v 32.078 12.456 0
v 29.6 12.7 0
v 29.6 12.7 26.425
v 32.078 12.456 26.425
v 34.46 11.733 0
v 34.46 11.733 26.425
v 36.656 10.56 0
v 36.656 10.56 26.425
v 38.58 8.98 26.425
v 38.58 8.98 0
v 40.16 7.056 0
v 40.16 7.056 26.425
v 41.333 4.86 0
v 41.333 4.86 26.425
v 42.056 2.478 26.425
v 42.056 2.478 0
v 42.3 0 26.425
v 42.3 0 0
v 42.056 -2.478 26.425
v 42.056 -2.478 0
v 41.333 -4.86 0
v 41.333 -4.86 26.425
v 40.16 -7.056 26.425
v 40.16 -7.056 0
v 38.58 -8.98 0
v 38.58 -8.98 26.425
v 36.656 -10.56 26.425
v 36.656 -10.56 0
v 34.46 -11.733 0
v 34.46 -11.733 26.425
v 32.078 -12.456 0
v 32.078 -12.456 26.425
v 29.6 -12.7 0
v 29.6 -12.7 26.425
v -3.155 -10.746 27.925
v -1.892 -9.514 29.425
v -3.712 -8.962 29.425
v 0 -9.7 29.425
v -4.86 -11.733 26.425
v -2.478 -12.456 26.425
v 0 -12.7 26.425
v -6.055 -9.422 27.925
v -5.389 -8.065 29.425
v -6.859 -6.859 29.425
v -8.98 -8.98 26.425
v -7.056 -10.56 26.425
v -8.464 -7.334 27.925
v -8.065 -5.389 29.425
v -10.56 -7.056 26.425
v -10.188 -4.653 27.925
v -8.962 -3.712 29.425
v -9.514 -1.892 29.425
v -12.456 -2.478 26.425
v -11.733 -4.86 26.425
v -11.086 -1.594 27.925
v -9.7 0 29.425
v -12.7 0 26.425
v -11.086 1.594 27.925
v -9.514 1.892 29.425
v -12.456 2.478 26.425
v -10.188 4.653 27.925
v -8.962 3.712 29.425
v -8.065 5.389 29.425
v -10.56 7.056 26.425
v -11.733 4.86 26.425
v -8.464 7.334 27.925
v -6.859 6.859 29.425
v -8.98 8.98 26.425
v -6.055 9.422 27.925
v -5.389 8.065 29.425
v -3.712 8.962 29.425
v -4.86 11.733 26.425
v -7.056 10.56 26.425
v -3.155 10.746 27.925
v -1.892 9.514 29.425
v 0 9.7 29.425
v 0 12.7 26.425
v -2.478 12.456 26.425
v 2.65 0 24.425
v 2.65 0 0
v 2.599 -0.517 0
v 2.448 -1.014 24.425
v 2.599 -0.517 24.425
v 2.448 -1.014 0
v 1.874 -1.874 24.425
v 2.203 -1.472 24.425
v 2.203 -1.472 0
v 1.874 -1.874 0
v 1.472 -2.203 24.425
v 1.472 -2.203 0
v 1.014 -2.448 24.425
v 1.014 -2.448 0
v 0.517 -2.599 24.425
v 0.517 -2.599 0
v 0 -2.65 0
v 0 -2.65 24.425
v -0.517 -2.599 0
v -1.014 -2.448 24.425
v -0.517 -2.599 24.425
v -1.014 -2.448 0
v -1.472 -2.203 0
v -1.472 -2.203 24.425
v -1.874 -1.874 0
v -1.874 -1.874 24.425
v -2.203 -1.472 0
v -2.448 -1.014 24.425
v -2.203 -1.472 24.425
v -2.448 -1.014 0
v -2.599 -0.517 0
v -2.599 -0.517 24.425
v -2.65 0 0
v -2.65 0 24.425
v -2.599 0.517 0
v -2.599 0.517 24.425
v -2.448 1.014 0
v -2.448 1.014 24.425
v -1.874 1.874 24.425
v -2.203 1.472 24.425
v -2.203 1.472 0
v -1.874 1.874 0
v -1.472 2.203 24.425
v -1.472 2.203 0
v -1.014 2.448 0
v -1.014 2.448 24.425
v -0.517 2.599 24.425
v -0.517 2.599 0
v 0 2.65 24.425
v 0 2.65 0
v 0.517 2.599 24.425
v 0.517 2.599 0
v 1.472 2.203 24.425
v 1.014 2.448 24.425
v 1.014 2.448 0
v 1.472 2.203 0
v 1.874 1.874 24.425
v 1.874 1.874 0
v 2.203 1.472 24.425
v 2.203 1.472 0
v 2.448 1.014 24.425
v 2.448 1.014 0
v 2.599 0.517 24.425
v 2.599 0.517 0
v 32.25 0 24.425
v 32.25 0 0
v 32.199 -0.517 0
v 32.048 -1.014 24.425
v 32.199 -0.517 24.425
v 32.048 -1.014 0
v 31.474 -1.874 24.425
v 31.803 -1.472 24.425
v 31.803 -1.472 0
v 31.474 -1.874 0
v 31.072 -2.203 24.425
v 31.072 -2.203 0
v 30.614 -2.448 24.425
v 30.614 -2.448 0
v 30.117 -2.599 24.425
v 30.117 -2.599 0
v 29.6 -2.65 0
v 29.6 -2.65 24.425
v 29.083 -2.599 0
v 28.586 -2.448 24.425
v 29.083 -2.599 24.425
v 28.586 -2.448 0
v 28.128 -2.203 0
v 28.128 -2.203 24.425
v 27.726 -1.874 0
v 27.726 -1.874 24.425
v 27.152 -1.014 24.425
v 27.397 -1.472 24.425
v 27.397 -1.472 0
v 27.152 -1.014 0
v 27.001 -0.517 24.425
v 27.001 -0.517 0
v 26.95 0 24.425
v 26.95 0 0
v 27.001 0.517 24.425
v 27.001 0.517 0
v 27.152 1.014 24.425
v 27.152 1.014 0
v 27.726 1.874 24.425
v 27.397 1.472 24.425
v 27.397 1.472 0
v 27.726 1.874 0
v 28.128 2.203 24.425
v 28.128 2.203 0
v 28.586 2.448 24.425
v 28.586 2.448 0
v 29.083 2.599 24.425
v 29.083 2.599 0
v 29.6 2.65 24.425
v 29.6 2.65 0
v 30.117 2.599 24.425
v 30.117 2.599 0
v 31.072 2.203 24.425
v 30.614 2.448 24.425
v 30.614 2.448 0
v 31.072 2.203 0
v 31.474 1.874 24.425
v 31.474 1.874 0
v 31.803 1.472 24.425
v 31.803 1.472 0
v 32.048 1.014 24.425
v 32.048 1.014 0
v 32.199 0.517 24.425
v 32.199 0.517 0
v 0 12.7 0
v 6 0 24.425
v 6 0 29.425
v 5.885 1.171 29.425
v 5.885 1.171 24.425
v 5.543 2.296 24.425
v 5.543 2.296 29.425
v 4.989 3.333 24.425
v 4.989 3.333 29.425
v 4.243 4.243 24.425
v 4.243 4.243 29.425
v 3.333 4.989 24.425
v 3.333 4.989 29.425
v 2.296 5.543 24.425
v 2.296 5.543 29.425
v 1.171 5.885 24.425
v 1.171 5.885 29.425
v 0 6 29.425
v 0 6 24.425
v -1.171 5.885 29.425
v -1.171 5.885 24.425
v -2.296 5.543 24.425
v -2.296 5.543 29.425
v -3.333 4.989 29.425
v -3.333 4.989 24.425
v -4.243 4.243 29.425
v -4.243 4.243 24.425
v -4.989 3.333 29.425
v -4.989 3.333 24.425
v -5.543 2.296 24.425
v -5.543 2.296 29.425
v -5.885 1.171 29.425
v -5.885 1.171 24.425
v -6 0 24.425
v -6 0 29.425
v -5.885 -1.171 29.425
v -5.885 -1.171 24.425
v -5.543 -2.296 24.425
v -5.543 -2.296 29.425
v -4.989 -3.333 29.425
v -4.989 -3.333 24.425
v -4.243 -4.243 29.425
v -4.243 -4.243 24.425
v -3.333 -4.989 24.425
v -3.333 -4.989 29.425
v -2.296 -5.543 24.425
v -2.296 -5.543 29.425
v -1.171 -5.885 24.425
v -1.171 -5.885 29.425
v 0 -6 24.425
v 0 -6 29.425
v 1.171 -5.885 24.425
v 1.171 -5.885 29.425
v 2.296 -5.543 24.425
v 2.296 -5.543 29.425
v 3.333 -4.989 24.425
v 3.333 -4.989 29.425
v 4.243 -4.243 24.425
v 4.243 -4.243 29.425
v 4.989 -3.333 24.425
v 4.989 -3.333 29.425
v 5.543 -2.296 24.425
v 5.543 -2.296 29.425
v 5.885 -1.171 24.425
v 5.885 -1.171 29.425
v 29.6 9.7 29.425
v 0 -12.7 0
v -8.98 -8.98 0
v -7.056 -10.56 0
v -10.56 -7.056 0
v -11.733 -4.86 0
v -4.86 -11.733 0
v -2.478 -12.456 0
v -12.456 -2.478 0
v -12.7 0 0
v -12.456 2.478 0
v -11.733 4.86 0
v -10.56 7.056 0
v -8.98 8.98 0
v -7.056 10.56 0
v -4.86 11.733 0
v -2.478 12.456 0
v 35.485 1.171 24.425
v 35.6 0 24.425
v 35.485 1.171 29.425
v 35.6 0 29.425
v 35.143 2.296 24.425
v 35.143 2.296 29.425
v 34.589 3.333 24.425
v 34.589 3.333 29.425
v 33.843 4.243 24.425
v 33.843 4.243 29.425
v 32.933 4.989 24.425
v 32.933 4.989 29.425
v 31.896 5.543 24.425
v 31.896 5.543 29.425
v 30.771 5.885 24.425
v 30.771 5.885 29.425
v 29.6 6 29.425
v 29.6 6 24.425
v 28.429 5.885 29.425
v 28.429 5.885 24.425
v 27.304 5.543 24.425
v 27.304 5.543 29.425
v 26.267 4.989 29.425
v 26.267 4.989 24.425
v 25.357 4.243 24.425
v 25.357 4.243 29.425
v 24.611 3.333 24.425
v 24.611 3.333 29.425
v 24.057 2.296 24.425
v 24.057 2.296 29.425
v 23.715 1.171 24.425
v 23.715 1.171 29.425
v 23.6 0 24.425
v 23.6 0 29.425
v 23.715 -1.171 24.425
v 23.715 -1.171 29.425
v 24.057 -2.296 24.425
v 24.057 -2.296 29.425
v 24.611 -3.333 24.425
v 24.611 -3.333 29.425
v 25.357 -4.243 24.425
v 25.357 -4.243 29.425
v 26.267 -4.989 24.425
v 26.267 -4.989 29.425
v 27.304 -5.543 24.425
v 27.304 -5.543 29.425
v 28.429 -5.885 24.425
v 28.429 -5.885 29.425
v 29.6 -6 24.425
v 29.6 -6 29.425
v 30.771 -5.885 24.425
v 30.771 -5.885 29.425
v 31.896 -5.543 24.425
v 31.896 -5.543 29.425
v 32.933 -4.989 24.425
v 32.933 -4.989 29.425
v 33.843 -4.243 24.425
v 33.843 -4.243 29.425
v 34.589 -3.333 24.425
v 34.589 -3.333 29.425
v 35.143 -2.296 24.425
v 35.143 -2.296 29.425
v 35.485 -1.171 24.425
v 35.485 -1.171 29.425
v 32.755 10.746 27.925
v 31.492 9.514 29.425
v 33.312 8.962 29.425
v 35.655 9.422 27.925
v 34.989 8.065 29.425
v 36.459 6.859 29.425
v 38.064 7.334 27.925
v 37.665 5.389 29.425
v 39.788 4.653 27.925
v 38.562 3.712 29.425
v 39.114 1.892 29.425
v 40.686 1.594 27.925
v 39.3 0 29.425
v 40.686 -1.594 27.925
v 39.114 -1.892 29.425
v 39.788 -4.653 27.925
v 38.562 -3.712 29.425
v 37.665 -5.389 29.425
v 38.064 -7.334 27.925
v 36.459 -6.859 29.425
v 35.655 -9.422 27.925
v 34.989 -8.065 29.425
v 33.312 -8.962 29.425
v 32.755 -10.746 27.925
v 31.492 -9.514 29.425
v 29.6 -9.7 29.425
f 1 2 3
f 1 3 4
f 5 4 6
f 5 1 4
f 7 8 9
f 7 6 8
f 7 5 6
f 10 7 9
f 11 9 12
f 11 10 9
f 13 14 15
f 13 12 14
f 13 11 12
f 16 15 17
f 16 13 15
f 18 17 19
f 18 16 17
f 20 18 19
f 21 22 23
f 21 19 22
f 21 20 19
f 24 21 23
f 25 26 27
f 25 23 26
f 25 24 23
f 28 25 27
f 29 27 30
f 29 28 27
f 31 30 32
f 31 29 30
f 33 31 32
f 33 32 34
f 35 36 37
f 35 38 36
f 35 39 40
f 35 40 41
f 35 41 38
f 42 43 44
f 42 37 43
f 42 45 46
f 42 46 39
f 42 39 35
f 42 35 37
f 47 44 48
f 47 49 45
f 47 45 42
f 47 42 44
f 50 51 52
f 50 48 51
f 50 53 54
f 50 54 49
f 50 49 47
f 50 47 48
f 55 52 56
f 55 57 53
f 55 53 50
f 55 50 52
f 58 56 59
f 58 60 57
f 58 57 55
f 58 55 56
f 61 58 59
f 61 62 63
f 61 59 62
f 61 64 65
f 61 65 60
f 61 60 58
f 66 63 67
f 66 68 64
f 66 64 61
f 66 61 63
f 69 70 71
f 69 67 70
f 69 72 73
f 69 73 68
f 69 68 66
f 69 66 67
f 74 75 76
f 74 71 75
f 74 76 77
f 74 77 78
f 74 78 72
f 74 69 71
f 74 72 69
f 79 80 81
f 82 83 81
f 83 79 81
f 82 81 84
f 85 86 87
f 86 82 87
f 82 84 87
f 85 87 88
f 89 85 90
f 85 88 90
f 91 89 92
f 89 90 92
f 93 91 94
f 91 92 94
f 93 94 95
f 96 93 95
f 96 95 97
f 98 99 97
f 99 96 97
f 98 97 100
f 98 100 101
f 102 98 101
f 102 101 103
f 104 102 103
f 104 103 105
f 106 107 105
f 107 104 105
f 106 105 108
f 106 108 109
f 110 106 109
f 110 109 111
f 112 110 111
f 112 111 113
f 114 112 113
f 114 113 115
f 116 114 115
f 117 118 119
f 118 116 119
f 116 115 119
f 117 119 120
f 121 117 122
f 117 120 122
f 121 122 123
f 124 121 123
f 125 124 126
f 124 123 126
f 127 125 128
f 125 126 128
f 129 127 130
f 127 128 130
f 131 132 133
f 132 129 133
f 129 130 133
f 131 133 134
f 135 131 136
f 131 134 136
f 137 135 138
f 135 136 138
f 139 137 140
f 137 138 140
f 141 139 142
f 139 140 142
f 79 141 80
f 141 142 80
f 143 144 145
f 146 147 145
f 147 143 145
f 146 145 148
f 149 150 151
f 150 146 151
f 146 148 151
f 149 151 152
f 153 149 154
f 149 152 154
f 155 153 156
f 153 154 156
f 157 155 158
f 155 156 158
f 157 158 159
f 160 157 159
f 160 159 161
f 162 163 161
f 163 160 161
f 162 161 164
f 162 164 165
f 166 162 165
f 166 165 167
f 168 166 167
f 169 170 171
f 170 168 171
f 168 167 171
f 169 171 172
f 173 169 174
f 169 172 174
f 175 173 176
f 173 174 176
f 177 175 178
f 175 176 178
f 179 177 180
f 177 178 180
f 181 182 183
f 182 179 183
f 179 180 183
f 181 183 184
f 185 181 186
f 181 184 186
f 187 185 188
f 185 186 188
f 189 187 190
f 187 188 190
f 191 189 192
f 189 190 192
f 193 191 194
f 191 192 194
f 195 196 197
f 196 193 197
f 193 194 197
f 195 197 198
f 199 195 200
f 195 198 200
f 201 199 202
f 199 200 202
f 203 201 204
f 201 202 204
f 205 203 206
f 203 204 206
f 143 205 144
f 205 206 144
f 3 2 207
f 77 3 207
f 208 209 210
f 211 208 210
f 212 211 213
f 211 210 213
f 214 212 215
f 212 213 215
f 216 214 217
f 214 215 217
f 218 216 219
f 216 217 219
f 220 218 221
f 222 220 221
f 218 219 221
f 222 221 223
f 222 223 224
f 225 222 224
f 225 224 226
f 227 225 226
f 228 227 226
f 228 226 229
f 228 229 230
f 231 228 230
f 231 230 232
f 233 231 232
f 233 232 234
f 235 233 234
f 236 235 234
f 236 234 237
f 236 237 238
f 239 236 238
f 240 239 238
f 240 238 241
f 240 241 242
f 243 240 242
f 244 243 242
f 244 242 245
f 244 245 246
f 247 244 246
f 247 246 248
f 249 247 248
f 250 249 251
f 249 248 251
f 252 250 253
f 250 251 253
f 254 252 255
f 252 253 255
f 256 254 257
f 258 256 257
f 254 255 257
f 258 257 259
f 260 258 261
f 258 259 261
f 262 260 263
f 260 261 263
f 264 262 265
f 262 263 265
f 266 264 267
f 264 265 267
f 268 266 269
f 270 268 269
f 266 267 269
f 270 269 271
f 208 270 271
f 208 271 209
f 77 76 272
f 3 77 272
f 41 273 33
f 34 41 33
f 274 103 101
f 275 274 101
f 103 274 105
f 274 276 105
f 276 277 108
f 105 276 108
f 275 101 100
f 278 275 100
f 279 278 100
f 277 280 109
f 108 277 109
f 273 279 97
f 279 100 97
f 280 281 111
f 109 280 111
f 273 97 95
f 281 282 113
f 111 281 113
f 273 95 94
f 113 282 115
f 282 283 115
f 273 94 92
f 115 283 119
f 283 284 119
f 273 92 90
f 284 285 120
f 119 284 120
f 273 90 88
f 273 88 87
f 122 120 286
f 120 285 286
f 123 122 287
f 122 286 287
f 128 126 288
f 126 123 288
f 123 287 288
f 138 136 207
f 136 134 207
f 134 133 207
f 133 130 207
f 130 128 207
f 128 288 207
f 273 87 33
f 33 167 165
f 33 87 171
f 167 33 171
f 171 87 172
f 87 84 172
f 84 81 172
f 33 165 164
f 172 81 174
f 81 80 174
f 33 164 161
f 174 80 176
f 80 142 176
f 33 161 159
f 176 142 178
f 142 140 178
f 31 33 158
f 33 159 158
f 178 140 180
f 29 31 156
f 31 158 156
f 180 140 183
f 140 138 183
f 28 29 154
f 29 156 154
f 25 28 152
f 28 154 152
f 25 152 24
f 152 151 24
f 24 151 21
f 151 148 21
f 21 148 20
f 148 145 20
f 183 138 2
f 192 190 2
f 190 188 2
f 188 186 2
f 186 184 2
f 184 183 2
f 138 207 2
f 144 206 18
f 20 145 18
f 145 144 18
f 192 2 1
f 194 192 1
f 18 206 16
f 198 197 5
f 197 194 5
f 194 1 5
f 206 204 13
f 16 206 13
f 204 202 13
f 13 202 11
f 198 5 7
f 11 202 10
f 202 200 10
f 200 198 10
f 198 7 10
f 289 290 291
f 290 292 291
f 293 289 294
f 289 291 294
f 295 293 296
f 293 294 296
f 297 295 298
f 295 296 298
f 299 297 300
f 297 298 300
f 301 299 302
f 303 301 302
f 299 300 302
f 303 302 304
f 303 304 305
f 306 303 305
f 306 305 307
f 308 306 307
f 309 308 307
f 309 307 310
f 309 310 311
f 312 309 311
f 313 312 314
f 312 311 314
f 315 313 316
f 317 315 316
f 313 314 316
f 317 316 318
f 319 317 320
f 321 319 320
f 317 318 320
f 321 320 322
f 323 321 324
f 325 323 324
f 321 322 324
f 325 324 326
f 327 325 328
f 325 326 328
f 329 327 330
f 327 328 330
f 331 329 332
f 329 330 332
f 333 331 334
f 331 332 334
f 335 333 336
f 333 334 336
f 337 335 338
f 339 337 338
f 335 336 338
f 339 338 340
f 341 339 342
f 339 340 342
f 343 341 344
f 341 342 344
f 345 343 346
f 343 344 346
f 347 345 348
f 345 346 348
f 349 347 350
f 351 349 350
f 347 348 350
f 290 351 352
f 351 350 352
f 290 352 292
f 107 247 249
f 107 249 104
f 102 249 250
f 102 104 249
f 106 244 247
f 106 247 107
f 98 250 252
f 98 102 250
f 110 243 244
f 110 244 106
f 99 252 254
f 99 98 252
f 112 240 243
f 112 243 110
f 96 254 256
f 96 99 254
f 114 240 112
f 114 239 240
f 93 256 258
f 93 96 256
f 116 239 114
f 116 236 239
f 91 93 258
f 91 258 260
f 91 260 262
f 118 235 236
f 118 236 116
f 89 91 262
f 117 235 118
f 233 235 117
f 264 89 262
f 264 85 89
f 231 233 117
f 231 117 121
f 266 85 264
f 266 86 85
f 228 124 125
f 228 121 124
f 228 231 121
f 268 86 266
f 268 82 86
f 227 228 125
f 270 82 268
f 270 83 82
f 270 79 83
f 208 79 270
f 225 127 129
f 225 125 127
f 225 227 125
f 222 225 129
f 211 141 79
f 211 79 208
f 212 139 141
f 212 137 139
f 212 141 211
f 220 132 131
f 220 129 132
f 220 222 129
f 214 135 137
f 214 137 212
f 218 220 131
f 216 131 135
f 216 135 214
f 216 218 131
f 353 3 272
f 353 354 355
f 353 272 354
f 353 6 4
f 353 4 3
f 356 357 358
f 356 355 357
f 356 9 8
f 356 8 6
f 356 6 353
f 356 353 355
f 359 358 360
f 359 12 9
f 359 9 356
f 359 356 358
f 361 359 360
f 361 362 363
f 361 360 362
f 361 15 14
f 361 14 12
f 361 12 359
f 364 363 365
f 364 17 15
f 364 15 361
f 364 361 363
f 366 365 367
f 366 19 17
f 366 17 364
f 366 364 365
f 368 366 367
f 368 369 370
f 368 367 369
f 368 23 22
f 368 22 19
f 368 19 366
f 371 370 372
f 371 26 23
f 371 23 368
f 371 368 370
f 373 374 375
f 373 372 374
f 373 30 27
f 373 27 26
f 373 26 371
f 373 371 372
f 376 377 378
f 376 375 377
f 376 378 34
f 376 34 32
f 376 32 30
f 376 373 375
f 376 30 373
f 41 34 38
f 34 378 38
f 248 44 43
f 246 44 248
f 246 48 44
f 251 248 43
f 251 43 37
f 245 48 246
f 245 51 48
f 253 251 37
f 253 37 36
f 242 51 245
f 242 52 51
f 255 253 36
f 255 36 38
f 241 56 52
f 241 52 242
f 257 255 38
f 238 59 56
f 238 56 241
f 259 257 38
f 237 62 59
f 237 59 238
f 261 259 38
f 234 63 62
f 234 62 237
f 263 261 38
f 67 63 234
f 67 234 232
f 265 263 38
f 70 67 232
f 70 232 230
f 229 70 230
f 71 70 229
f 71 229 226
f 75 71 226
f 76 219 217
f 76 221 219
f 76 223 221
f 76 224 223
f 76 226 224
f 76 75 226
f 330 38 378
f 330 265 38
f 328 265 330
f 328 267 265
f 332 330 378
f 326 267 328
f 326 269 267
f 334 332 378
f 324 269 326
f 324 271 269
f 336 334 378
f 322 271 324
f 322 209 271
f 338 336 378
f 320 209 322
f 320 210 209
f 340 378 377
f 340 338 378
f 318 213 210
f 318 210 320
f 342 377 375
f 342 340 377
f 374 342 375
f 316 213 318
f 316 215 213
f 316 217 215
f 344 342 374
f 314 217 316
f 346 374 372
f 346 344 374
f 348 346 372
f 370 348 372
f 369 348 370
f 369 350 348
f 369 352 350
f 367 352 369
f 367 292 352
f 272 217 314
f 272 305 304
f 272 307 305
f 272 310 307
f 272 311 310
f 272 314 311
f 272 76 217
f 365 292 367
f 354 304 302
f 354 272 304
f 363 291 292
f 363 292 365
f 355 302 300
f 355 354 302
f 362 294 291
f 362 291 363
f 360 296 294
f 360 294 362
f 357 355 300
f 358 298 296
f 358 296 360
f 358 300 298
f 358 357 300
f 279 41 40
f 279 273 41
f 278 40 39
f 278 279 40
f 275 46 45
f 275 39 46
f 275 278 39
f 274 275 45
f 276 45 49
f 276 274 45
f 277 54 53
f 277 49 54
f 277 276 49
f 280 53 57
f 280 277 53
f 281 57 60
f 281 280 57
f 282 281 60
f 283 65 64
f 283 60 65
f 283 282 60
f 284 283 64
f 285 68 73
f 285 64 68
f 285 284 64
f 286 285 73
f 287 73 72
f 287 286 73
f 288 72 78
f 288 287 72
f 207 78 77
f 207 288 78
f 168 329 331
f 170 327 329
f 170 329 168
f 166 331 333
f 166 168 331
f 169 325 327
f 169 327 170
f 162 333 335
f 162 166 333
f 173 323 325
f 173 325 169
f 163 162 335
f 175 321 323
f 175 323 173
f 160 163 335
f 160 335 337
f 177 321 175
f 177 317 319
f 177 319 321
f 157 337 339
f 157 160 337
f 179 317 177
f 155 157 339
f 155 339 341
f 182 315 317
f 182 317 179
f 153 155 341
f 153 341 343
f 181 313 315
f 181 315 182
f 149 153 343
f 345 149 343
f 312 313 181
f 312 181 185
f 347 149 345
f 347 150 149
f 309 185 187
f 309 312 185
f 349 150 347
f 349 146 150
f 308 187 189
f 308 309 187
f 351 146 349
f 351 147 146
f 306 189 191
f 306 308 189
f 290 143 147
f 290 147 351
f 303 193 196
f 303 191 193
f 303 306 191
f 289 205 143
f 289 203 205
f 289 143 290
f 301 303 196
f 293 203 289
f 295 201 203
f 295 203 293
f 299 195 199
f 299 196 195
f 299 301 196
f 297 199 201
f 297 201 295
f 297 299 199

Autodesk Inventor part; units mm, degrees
ref_plane "YZ Plane" through (0, 0, 0) normal (1, 0, 0) x (0, 1, 0)
ref_plane "XZ Plane" through (0, 0, 0) normal (0, 1, 0) x (-1, 0, 0)
ref_plane "XY Plane" through (0, 0, 0) normal (0, 0, 1) x (1, 0, 0)
sketch "Sketch1" plane through (0, 0, 0) normal (0, 0, 1) x (1, 0, 0)
  line L0 (0, 0) -> (29.6, 0) construction
  line L1 (0, -12.7) -> (29.6, -12.7)
  line L2 (29.6, 12.7) -> (0, 12.7)
  arc A0 (0, 12.7) -> (0, -12.7) centre (0, 0) ccw
  arc A1 (29.6, -12.7) -> (29.6, 12.7) centre (29.6, 0) ccw
  circle A2 centre (0, 0) radius 2.65
  circle A3 centre (29.6, 0) radius 2.65
  point P0 (14.8, 0)
  dimension "d0" = 29.6
  dimension "d1" = 5.3
  dimension "d2" = 5.3
  dimension "d9" = 25.4
extrude "Extrusion1" add sketch "Sketch1" along normal blind 29.425
sketch "Sketch2" plane through (0, 0, 29.425) normal (0, 0, 1) x (1, 0, 0)
  circle A0 centre (0, 0) radius 2.65 projected
  circle A1 centre (29.6, 0) radius 2.65 projected
  circle A2 centre (0, 0) radius 6
  circle A3 centre (29.6, 0) radius 6
  dimension "d6" = 12
extrude "Extrusion2" cut sketch "Sketch2" against normal blind 5
chamfer "Chamfer1" distance 3 angle 45 4 edges at (14.8, 12.7, 29.425) (-12.7, 0, 29.425) (14.8, -12.7, 29.425) (42.3, 0, 29.425)
properties part number "Tope" material "ABS Plastic"
